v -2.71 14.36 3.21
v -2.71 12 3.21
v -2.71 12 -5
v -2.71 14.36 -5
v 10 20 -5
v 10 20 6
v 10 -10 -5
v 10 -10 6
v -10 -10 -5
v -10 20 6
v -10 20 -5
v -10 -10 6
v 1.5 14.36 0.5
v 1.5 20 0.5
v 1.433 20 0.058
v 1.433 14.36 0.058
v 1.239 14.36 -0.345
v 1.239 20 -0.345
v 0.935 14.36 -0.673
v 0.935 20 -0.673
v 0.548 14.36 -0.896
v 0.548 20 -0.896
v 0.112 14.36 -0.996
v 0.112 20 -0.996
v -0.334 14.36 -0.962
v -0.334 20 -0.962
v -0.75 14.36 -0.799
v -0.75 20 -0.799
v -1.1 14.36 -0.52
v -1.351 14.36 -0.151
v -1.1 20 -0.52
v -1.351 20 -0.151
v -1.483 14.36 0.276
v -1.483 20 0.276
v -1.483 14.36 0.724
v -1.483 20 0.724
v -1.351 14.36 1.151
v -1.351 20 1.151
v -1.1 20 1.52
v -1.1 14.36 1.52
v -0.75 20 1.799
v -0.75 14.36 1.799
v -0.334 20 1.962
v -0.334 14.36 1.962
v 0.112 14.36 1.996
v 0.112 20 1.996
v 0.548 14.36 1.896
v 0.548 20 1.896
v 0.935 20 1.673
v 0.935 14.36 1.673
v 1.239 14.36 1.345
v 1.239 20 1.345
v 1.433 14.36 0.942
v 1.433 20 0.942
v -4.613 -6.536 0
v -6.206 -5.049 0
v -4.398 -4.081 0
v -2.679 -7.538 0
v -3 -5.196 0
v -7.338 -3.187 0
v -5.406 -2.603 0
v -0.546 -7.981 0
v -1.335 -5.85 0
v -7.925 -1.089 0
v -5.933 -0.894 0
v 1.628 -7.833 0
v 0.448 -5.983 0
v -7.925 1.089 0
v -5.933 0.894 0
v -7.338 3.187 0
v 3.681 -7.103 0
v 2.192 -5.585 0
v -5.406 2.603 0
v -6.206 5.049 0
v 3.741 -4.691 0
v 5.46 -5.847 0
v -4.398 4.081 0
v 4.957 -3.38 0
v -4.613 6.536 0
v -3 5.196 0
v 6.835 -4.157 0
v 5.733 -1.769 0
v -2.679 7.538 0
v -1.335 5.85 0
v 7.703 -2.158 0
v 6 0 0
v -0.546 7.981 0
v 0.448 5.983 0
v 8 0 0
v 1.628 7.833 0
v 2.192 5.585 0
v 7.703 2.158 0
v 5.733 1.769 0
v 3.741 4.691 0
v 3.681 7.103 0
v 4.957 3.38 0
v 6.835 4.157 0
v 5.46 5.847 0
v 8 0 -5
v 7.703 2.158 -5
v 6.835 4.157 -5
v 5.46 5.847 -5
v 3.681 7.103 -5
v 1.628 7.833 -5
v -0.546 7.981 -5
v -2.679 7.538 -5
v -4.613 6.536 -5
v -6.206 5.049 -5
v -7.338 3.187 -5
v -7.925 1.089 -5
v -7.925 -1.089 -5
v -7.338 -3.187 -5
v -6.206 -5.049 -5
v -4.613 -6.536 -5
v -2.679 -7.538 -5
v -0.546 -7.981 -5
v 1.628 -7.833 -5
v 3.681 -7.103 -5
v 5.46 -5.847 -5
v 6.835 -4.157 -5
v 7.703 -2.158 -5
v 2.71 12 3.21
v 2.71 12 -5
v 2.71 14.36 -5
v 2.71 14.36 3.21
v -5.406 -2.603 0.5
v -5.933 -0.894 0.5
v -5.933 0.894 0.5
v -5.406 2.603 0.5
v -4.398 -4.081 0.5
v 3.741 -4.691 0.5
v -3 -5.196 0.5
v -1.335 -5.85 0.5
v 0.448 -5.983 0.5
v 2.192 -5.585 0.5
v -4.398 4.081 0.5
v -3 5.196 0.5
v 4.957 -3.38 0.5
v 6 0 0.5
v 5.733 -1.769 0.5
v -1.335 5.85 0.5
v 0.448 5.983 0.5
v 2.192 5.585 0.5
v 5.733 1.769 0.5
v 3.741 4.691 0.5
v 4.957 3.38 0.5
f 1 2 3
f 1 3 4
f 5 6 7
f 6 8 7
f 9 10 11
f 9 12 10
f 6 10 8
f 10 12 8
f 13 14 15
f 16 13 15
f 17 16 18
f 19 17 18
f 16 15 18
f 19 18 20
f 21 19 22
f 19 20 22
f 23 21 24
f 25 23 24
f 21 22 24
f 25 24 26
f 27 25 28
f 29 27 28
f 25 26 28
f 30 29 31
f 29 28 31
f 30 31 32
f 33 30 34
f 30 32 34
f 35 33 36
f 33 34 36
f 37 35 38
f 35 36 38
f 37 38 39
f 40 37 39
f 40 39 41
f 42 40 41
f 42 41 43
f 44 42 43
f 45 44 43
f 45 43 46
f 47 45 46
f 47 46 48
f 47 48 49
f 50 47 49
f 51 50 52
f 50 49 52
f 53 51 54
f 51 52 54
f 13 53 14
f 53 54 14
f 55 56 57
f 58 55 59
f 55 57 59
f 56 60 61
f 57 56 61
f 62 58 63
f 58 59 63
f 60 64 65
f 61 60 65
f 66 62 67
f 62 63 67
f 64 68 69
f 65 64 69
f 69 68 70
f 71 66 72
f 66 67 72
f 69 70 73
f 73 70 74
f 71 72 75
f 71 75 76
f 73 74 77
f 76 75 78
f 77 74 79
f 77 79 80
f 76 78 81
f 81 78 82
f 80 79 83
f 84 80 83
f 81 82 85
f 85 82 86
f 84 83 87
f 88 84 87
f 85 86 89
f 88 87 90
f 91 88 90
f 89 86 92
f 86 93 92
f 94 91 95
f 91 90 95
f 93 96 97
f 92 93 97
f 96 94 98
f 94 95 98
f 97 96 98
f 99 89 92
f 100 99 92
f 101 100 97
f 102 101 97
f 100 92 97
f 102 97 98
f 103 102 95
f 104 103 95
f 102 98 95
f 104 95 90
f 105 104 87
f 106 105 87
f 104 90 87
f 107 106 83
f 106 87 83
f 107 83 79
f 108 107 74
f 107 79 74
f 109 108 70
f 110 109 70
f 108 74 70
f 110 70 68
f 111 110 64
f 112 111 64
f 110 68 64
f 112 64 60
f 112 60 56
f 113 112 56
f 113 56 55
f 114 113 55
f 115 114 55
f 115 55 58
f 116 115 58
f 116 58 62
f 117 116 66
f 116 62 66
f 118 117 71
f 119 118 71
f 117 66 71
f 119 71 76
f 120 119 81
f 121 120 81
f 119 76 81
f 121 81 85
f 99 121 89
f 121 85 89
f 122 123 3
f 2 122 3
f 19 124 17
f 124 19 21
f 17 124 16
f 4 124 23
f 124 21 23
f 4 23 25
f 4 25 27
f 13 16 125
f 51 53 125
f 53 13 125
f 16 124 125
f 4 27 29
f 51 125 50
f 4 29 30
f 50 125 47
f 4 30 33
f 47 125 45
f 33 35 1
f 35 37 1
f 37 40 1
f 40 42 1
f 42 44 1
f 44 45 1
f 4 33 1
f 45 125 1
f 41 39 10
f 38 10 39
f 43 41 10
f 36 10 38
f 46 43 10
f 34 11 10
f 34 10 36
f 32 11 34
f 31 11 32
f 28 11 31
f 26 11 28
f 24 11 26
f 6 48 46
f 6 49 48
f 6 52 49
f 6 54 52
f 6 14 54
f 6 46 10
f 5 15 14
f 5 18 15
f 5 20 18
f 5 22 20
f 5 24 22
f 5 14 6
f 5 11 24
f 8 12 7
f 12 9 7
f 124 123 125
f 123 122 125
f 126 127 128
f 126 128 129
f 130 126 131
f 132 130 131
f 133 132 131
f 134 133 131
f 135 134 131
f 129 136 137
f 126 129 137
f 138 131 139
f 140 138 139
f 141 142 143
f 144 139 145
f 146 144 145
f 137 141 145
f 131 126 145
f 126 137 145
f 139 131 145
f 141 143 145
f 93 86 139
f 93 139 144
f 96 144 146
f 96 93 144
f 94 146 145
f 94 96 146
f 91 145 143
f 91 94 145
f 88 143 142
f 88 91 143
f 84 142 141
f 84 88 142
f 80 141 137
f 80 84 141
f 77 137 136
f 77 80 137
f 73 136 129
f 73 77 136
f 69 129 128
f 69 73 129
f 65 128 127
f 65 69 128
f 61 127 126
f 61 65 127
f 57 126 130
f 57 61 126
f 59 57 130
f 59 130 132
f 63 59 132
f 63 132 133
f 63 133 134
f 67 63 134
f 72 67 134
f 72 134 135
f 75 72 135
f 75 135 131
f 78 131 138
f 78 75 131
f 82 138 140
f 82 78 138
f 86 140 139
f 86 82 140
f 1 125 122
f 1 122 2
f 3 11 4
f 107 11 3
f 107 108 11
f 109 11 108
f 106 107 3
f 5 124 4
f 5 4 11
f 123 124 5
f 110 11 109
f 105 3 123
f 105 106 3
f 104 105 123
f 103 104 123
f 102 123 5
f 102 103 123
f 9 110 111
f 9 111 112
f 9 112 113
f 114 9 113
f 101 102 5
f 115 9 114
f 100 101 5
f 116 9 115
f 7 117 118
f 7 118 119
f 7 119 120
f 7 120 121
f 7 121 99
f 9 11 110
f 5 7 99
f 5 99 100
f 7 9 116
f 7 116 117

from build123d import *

# Parameters (mm, degrees)
SKETCH1_W           = 20
SKETCH1_H           = 20
SKETCH1_R           = 8
FIRSTLAYER_DEPTH    = 5
SKETCH2_W           = 20
SKETCH2_H           = 20
SKETCH2_R           = 6
SECONDLAYER_DEPTH   = 0.5
SKETCH3_W           = 20
SKETCH3_H           = 20
THIRDLAYER_DEPTH    = 5.5
SKETCH4_W           = 20
SKETCH4_H           = 11
BOSS_EXTRUDE4_DEPTH = 10
SKETCH10_W          = 5.42
SKETCH10_H          = 2.36
NUT_HOLE_DEPTH      = 5.5
NUT_HOLE_DEPTH_BACK = 2.71
SKETCH11_R          = 1.5
SCREW_HOLE_DEPTH    = 5.64


with BuildPart() as part:
    # Sketch1 → FirstLayer (new body)
    with BuildSketch(Plane.XY):
        Rectangle(SKETCH1_W, SKETCH1_H)
        Circle(SKETCH1_R, mode=Mode.SUBTRACT)
    extrude(amount=-FIRSTLAYER_DEPTH)

    # Sketch2 → SecondLayer (add)
    with BuildSketch(Plane.XY):
        Rectangle(SKETCH2_W, SKETCH2_H)
        Circle(SKETCH2_R, mode=Mode.SUBTRACT)
    extrude(amount=SECONDLAYER_DEPTH)

    # Sketch3 → ThirdLayer (add)
    with BuildSketch(Plane.XY.offset(0.5)):
        Rectangle(SKETCH3_W, SKETCH3_H)
    extrude(amount=THIRDLAYER_DEPTH)

    # Sketch4 → Boss-Extrude4 (add)
    with BuildSketch(Plane(origin=(0, 10, 0), x_dir=(1, 0, 0), z_dir=(0, 1, 0))):
        with Locations((0, -0.5)):
            Rectangle(SKETCH4_W, SKETCH4_H)
    extrude(amount=BOSS_EXTRUDE4_DEPTH)

    # Sketch10 → Nut Hole (cut, two sides)
    with BuildSketch(Plane(origin=(0, 0, 0.5), x_dir=(-1, 0, 0), z_dir=(0, 0, -1))) as nut_hole_sk:
        with Locations((0, 13.18)):
            Rectangle(SKETCH10_W, SKETCH10_H)
    extrude(amount=NUT_HOLE_DEPTH, mode=Mode.SUBTRACT)
    extrude(nut_hole_sk.sketch, amount=-NUT_HOLE_DEPTH_BACK, mode=Mode.SUBTRACT)

    # Sketch11 → Screw Hole (cut)
    with BuildSketch(Plane(origin=(0, 20, 0), x_dir=(1, 0, 0), z_dir=(0, 1, 0))):
        with Locations((0, -0.5)):
            Circle(SKETCH11_R)
    extrude(amount=-SCREW_HOLE_DEPTH, mode=Mode.SUBTRACT)


solid = part.part
